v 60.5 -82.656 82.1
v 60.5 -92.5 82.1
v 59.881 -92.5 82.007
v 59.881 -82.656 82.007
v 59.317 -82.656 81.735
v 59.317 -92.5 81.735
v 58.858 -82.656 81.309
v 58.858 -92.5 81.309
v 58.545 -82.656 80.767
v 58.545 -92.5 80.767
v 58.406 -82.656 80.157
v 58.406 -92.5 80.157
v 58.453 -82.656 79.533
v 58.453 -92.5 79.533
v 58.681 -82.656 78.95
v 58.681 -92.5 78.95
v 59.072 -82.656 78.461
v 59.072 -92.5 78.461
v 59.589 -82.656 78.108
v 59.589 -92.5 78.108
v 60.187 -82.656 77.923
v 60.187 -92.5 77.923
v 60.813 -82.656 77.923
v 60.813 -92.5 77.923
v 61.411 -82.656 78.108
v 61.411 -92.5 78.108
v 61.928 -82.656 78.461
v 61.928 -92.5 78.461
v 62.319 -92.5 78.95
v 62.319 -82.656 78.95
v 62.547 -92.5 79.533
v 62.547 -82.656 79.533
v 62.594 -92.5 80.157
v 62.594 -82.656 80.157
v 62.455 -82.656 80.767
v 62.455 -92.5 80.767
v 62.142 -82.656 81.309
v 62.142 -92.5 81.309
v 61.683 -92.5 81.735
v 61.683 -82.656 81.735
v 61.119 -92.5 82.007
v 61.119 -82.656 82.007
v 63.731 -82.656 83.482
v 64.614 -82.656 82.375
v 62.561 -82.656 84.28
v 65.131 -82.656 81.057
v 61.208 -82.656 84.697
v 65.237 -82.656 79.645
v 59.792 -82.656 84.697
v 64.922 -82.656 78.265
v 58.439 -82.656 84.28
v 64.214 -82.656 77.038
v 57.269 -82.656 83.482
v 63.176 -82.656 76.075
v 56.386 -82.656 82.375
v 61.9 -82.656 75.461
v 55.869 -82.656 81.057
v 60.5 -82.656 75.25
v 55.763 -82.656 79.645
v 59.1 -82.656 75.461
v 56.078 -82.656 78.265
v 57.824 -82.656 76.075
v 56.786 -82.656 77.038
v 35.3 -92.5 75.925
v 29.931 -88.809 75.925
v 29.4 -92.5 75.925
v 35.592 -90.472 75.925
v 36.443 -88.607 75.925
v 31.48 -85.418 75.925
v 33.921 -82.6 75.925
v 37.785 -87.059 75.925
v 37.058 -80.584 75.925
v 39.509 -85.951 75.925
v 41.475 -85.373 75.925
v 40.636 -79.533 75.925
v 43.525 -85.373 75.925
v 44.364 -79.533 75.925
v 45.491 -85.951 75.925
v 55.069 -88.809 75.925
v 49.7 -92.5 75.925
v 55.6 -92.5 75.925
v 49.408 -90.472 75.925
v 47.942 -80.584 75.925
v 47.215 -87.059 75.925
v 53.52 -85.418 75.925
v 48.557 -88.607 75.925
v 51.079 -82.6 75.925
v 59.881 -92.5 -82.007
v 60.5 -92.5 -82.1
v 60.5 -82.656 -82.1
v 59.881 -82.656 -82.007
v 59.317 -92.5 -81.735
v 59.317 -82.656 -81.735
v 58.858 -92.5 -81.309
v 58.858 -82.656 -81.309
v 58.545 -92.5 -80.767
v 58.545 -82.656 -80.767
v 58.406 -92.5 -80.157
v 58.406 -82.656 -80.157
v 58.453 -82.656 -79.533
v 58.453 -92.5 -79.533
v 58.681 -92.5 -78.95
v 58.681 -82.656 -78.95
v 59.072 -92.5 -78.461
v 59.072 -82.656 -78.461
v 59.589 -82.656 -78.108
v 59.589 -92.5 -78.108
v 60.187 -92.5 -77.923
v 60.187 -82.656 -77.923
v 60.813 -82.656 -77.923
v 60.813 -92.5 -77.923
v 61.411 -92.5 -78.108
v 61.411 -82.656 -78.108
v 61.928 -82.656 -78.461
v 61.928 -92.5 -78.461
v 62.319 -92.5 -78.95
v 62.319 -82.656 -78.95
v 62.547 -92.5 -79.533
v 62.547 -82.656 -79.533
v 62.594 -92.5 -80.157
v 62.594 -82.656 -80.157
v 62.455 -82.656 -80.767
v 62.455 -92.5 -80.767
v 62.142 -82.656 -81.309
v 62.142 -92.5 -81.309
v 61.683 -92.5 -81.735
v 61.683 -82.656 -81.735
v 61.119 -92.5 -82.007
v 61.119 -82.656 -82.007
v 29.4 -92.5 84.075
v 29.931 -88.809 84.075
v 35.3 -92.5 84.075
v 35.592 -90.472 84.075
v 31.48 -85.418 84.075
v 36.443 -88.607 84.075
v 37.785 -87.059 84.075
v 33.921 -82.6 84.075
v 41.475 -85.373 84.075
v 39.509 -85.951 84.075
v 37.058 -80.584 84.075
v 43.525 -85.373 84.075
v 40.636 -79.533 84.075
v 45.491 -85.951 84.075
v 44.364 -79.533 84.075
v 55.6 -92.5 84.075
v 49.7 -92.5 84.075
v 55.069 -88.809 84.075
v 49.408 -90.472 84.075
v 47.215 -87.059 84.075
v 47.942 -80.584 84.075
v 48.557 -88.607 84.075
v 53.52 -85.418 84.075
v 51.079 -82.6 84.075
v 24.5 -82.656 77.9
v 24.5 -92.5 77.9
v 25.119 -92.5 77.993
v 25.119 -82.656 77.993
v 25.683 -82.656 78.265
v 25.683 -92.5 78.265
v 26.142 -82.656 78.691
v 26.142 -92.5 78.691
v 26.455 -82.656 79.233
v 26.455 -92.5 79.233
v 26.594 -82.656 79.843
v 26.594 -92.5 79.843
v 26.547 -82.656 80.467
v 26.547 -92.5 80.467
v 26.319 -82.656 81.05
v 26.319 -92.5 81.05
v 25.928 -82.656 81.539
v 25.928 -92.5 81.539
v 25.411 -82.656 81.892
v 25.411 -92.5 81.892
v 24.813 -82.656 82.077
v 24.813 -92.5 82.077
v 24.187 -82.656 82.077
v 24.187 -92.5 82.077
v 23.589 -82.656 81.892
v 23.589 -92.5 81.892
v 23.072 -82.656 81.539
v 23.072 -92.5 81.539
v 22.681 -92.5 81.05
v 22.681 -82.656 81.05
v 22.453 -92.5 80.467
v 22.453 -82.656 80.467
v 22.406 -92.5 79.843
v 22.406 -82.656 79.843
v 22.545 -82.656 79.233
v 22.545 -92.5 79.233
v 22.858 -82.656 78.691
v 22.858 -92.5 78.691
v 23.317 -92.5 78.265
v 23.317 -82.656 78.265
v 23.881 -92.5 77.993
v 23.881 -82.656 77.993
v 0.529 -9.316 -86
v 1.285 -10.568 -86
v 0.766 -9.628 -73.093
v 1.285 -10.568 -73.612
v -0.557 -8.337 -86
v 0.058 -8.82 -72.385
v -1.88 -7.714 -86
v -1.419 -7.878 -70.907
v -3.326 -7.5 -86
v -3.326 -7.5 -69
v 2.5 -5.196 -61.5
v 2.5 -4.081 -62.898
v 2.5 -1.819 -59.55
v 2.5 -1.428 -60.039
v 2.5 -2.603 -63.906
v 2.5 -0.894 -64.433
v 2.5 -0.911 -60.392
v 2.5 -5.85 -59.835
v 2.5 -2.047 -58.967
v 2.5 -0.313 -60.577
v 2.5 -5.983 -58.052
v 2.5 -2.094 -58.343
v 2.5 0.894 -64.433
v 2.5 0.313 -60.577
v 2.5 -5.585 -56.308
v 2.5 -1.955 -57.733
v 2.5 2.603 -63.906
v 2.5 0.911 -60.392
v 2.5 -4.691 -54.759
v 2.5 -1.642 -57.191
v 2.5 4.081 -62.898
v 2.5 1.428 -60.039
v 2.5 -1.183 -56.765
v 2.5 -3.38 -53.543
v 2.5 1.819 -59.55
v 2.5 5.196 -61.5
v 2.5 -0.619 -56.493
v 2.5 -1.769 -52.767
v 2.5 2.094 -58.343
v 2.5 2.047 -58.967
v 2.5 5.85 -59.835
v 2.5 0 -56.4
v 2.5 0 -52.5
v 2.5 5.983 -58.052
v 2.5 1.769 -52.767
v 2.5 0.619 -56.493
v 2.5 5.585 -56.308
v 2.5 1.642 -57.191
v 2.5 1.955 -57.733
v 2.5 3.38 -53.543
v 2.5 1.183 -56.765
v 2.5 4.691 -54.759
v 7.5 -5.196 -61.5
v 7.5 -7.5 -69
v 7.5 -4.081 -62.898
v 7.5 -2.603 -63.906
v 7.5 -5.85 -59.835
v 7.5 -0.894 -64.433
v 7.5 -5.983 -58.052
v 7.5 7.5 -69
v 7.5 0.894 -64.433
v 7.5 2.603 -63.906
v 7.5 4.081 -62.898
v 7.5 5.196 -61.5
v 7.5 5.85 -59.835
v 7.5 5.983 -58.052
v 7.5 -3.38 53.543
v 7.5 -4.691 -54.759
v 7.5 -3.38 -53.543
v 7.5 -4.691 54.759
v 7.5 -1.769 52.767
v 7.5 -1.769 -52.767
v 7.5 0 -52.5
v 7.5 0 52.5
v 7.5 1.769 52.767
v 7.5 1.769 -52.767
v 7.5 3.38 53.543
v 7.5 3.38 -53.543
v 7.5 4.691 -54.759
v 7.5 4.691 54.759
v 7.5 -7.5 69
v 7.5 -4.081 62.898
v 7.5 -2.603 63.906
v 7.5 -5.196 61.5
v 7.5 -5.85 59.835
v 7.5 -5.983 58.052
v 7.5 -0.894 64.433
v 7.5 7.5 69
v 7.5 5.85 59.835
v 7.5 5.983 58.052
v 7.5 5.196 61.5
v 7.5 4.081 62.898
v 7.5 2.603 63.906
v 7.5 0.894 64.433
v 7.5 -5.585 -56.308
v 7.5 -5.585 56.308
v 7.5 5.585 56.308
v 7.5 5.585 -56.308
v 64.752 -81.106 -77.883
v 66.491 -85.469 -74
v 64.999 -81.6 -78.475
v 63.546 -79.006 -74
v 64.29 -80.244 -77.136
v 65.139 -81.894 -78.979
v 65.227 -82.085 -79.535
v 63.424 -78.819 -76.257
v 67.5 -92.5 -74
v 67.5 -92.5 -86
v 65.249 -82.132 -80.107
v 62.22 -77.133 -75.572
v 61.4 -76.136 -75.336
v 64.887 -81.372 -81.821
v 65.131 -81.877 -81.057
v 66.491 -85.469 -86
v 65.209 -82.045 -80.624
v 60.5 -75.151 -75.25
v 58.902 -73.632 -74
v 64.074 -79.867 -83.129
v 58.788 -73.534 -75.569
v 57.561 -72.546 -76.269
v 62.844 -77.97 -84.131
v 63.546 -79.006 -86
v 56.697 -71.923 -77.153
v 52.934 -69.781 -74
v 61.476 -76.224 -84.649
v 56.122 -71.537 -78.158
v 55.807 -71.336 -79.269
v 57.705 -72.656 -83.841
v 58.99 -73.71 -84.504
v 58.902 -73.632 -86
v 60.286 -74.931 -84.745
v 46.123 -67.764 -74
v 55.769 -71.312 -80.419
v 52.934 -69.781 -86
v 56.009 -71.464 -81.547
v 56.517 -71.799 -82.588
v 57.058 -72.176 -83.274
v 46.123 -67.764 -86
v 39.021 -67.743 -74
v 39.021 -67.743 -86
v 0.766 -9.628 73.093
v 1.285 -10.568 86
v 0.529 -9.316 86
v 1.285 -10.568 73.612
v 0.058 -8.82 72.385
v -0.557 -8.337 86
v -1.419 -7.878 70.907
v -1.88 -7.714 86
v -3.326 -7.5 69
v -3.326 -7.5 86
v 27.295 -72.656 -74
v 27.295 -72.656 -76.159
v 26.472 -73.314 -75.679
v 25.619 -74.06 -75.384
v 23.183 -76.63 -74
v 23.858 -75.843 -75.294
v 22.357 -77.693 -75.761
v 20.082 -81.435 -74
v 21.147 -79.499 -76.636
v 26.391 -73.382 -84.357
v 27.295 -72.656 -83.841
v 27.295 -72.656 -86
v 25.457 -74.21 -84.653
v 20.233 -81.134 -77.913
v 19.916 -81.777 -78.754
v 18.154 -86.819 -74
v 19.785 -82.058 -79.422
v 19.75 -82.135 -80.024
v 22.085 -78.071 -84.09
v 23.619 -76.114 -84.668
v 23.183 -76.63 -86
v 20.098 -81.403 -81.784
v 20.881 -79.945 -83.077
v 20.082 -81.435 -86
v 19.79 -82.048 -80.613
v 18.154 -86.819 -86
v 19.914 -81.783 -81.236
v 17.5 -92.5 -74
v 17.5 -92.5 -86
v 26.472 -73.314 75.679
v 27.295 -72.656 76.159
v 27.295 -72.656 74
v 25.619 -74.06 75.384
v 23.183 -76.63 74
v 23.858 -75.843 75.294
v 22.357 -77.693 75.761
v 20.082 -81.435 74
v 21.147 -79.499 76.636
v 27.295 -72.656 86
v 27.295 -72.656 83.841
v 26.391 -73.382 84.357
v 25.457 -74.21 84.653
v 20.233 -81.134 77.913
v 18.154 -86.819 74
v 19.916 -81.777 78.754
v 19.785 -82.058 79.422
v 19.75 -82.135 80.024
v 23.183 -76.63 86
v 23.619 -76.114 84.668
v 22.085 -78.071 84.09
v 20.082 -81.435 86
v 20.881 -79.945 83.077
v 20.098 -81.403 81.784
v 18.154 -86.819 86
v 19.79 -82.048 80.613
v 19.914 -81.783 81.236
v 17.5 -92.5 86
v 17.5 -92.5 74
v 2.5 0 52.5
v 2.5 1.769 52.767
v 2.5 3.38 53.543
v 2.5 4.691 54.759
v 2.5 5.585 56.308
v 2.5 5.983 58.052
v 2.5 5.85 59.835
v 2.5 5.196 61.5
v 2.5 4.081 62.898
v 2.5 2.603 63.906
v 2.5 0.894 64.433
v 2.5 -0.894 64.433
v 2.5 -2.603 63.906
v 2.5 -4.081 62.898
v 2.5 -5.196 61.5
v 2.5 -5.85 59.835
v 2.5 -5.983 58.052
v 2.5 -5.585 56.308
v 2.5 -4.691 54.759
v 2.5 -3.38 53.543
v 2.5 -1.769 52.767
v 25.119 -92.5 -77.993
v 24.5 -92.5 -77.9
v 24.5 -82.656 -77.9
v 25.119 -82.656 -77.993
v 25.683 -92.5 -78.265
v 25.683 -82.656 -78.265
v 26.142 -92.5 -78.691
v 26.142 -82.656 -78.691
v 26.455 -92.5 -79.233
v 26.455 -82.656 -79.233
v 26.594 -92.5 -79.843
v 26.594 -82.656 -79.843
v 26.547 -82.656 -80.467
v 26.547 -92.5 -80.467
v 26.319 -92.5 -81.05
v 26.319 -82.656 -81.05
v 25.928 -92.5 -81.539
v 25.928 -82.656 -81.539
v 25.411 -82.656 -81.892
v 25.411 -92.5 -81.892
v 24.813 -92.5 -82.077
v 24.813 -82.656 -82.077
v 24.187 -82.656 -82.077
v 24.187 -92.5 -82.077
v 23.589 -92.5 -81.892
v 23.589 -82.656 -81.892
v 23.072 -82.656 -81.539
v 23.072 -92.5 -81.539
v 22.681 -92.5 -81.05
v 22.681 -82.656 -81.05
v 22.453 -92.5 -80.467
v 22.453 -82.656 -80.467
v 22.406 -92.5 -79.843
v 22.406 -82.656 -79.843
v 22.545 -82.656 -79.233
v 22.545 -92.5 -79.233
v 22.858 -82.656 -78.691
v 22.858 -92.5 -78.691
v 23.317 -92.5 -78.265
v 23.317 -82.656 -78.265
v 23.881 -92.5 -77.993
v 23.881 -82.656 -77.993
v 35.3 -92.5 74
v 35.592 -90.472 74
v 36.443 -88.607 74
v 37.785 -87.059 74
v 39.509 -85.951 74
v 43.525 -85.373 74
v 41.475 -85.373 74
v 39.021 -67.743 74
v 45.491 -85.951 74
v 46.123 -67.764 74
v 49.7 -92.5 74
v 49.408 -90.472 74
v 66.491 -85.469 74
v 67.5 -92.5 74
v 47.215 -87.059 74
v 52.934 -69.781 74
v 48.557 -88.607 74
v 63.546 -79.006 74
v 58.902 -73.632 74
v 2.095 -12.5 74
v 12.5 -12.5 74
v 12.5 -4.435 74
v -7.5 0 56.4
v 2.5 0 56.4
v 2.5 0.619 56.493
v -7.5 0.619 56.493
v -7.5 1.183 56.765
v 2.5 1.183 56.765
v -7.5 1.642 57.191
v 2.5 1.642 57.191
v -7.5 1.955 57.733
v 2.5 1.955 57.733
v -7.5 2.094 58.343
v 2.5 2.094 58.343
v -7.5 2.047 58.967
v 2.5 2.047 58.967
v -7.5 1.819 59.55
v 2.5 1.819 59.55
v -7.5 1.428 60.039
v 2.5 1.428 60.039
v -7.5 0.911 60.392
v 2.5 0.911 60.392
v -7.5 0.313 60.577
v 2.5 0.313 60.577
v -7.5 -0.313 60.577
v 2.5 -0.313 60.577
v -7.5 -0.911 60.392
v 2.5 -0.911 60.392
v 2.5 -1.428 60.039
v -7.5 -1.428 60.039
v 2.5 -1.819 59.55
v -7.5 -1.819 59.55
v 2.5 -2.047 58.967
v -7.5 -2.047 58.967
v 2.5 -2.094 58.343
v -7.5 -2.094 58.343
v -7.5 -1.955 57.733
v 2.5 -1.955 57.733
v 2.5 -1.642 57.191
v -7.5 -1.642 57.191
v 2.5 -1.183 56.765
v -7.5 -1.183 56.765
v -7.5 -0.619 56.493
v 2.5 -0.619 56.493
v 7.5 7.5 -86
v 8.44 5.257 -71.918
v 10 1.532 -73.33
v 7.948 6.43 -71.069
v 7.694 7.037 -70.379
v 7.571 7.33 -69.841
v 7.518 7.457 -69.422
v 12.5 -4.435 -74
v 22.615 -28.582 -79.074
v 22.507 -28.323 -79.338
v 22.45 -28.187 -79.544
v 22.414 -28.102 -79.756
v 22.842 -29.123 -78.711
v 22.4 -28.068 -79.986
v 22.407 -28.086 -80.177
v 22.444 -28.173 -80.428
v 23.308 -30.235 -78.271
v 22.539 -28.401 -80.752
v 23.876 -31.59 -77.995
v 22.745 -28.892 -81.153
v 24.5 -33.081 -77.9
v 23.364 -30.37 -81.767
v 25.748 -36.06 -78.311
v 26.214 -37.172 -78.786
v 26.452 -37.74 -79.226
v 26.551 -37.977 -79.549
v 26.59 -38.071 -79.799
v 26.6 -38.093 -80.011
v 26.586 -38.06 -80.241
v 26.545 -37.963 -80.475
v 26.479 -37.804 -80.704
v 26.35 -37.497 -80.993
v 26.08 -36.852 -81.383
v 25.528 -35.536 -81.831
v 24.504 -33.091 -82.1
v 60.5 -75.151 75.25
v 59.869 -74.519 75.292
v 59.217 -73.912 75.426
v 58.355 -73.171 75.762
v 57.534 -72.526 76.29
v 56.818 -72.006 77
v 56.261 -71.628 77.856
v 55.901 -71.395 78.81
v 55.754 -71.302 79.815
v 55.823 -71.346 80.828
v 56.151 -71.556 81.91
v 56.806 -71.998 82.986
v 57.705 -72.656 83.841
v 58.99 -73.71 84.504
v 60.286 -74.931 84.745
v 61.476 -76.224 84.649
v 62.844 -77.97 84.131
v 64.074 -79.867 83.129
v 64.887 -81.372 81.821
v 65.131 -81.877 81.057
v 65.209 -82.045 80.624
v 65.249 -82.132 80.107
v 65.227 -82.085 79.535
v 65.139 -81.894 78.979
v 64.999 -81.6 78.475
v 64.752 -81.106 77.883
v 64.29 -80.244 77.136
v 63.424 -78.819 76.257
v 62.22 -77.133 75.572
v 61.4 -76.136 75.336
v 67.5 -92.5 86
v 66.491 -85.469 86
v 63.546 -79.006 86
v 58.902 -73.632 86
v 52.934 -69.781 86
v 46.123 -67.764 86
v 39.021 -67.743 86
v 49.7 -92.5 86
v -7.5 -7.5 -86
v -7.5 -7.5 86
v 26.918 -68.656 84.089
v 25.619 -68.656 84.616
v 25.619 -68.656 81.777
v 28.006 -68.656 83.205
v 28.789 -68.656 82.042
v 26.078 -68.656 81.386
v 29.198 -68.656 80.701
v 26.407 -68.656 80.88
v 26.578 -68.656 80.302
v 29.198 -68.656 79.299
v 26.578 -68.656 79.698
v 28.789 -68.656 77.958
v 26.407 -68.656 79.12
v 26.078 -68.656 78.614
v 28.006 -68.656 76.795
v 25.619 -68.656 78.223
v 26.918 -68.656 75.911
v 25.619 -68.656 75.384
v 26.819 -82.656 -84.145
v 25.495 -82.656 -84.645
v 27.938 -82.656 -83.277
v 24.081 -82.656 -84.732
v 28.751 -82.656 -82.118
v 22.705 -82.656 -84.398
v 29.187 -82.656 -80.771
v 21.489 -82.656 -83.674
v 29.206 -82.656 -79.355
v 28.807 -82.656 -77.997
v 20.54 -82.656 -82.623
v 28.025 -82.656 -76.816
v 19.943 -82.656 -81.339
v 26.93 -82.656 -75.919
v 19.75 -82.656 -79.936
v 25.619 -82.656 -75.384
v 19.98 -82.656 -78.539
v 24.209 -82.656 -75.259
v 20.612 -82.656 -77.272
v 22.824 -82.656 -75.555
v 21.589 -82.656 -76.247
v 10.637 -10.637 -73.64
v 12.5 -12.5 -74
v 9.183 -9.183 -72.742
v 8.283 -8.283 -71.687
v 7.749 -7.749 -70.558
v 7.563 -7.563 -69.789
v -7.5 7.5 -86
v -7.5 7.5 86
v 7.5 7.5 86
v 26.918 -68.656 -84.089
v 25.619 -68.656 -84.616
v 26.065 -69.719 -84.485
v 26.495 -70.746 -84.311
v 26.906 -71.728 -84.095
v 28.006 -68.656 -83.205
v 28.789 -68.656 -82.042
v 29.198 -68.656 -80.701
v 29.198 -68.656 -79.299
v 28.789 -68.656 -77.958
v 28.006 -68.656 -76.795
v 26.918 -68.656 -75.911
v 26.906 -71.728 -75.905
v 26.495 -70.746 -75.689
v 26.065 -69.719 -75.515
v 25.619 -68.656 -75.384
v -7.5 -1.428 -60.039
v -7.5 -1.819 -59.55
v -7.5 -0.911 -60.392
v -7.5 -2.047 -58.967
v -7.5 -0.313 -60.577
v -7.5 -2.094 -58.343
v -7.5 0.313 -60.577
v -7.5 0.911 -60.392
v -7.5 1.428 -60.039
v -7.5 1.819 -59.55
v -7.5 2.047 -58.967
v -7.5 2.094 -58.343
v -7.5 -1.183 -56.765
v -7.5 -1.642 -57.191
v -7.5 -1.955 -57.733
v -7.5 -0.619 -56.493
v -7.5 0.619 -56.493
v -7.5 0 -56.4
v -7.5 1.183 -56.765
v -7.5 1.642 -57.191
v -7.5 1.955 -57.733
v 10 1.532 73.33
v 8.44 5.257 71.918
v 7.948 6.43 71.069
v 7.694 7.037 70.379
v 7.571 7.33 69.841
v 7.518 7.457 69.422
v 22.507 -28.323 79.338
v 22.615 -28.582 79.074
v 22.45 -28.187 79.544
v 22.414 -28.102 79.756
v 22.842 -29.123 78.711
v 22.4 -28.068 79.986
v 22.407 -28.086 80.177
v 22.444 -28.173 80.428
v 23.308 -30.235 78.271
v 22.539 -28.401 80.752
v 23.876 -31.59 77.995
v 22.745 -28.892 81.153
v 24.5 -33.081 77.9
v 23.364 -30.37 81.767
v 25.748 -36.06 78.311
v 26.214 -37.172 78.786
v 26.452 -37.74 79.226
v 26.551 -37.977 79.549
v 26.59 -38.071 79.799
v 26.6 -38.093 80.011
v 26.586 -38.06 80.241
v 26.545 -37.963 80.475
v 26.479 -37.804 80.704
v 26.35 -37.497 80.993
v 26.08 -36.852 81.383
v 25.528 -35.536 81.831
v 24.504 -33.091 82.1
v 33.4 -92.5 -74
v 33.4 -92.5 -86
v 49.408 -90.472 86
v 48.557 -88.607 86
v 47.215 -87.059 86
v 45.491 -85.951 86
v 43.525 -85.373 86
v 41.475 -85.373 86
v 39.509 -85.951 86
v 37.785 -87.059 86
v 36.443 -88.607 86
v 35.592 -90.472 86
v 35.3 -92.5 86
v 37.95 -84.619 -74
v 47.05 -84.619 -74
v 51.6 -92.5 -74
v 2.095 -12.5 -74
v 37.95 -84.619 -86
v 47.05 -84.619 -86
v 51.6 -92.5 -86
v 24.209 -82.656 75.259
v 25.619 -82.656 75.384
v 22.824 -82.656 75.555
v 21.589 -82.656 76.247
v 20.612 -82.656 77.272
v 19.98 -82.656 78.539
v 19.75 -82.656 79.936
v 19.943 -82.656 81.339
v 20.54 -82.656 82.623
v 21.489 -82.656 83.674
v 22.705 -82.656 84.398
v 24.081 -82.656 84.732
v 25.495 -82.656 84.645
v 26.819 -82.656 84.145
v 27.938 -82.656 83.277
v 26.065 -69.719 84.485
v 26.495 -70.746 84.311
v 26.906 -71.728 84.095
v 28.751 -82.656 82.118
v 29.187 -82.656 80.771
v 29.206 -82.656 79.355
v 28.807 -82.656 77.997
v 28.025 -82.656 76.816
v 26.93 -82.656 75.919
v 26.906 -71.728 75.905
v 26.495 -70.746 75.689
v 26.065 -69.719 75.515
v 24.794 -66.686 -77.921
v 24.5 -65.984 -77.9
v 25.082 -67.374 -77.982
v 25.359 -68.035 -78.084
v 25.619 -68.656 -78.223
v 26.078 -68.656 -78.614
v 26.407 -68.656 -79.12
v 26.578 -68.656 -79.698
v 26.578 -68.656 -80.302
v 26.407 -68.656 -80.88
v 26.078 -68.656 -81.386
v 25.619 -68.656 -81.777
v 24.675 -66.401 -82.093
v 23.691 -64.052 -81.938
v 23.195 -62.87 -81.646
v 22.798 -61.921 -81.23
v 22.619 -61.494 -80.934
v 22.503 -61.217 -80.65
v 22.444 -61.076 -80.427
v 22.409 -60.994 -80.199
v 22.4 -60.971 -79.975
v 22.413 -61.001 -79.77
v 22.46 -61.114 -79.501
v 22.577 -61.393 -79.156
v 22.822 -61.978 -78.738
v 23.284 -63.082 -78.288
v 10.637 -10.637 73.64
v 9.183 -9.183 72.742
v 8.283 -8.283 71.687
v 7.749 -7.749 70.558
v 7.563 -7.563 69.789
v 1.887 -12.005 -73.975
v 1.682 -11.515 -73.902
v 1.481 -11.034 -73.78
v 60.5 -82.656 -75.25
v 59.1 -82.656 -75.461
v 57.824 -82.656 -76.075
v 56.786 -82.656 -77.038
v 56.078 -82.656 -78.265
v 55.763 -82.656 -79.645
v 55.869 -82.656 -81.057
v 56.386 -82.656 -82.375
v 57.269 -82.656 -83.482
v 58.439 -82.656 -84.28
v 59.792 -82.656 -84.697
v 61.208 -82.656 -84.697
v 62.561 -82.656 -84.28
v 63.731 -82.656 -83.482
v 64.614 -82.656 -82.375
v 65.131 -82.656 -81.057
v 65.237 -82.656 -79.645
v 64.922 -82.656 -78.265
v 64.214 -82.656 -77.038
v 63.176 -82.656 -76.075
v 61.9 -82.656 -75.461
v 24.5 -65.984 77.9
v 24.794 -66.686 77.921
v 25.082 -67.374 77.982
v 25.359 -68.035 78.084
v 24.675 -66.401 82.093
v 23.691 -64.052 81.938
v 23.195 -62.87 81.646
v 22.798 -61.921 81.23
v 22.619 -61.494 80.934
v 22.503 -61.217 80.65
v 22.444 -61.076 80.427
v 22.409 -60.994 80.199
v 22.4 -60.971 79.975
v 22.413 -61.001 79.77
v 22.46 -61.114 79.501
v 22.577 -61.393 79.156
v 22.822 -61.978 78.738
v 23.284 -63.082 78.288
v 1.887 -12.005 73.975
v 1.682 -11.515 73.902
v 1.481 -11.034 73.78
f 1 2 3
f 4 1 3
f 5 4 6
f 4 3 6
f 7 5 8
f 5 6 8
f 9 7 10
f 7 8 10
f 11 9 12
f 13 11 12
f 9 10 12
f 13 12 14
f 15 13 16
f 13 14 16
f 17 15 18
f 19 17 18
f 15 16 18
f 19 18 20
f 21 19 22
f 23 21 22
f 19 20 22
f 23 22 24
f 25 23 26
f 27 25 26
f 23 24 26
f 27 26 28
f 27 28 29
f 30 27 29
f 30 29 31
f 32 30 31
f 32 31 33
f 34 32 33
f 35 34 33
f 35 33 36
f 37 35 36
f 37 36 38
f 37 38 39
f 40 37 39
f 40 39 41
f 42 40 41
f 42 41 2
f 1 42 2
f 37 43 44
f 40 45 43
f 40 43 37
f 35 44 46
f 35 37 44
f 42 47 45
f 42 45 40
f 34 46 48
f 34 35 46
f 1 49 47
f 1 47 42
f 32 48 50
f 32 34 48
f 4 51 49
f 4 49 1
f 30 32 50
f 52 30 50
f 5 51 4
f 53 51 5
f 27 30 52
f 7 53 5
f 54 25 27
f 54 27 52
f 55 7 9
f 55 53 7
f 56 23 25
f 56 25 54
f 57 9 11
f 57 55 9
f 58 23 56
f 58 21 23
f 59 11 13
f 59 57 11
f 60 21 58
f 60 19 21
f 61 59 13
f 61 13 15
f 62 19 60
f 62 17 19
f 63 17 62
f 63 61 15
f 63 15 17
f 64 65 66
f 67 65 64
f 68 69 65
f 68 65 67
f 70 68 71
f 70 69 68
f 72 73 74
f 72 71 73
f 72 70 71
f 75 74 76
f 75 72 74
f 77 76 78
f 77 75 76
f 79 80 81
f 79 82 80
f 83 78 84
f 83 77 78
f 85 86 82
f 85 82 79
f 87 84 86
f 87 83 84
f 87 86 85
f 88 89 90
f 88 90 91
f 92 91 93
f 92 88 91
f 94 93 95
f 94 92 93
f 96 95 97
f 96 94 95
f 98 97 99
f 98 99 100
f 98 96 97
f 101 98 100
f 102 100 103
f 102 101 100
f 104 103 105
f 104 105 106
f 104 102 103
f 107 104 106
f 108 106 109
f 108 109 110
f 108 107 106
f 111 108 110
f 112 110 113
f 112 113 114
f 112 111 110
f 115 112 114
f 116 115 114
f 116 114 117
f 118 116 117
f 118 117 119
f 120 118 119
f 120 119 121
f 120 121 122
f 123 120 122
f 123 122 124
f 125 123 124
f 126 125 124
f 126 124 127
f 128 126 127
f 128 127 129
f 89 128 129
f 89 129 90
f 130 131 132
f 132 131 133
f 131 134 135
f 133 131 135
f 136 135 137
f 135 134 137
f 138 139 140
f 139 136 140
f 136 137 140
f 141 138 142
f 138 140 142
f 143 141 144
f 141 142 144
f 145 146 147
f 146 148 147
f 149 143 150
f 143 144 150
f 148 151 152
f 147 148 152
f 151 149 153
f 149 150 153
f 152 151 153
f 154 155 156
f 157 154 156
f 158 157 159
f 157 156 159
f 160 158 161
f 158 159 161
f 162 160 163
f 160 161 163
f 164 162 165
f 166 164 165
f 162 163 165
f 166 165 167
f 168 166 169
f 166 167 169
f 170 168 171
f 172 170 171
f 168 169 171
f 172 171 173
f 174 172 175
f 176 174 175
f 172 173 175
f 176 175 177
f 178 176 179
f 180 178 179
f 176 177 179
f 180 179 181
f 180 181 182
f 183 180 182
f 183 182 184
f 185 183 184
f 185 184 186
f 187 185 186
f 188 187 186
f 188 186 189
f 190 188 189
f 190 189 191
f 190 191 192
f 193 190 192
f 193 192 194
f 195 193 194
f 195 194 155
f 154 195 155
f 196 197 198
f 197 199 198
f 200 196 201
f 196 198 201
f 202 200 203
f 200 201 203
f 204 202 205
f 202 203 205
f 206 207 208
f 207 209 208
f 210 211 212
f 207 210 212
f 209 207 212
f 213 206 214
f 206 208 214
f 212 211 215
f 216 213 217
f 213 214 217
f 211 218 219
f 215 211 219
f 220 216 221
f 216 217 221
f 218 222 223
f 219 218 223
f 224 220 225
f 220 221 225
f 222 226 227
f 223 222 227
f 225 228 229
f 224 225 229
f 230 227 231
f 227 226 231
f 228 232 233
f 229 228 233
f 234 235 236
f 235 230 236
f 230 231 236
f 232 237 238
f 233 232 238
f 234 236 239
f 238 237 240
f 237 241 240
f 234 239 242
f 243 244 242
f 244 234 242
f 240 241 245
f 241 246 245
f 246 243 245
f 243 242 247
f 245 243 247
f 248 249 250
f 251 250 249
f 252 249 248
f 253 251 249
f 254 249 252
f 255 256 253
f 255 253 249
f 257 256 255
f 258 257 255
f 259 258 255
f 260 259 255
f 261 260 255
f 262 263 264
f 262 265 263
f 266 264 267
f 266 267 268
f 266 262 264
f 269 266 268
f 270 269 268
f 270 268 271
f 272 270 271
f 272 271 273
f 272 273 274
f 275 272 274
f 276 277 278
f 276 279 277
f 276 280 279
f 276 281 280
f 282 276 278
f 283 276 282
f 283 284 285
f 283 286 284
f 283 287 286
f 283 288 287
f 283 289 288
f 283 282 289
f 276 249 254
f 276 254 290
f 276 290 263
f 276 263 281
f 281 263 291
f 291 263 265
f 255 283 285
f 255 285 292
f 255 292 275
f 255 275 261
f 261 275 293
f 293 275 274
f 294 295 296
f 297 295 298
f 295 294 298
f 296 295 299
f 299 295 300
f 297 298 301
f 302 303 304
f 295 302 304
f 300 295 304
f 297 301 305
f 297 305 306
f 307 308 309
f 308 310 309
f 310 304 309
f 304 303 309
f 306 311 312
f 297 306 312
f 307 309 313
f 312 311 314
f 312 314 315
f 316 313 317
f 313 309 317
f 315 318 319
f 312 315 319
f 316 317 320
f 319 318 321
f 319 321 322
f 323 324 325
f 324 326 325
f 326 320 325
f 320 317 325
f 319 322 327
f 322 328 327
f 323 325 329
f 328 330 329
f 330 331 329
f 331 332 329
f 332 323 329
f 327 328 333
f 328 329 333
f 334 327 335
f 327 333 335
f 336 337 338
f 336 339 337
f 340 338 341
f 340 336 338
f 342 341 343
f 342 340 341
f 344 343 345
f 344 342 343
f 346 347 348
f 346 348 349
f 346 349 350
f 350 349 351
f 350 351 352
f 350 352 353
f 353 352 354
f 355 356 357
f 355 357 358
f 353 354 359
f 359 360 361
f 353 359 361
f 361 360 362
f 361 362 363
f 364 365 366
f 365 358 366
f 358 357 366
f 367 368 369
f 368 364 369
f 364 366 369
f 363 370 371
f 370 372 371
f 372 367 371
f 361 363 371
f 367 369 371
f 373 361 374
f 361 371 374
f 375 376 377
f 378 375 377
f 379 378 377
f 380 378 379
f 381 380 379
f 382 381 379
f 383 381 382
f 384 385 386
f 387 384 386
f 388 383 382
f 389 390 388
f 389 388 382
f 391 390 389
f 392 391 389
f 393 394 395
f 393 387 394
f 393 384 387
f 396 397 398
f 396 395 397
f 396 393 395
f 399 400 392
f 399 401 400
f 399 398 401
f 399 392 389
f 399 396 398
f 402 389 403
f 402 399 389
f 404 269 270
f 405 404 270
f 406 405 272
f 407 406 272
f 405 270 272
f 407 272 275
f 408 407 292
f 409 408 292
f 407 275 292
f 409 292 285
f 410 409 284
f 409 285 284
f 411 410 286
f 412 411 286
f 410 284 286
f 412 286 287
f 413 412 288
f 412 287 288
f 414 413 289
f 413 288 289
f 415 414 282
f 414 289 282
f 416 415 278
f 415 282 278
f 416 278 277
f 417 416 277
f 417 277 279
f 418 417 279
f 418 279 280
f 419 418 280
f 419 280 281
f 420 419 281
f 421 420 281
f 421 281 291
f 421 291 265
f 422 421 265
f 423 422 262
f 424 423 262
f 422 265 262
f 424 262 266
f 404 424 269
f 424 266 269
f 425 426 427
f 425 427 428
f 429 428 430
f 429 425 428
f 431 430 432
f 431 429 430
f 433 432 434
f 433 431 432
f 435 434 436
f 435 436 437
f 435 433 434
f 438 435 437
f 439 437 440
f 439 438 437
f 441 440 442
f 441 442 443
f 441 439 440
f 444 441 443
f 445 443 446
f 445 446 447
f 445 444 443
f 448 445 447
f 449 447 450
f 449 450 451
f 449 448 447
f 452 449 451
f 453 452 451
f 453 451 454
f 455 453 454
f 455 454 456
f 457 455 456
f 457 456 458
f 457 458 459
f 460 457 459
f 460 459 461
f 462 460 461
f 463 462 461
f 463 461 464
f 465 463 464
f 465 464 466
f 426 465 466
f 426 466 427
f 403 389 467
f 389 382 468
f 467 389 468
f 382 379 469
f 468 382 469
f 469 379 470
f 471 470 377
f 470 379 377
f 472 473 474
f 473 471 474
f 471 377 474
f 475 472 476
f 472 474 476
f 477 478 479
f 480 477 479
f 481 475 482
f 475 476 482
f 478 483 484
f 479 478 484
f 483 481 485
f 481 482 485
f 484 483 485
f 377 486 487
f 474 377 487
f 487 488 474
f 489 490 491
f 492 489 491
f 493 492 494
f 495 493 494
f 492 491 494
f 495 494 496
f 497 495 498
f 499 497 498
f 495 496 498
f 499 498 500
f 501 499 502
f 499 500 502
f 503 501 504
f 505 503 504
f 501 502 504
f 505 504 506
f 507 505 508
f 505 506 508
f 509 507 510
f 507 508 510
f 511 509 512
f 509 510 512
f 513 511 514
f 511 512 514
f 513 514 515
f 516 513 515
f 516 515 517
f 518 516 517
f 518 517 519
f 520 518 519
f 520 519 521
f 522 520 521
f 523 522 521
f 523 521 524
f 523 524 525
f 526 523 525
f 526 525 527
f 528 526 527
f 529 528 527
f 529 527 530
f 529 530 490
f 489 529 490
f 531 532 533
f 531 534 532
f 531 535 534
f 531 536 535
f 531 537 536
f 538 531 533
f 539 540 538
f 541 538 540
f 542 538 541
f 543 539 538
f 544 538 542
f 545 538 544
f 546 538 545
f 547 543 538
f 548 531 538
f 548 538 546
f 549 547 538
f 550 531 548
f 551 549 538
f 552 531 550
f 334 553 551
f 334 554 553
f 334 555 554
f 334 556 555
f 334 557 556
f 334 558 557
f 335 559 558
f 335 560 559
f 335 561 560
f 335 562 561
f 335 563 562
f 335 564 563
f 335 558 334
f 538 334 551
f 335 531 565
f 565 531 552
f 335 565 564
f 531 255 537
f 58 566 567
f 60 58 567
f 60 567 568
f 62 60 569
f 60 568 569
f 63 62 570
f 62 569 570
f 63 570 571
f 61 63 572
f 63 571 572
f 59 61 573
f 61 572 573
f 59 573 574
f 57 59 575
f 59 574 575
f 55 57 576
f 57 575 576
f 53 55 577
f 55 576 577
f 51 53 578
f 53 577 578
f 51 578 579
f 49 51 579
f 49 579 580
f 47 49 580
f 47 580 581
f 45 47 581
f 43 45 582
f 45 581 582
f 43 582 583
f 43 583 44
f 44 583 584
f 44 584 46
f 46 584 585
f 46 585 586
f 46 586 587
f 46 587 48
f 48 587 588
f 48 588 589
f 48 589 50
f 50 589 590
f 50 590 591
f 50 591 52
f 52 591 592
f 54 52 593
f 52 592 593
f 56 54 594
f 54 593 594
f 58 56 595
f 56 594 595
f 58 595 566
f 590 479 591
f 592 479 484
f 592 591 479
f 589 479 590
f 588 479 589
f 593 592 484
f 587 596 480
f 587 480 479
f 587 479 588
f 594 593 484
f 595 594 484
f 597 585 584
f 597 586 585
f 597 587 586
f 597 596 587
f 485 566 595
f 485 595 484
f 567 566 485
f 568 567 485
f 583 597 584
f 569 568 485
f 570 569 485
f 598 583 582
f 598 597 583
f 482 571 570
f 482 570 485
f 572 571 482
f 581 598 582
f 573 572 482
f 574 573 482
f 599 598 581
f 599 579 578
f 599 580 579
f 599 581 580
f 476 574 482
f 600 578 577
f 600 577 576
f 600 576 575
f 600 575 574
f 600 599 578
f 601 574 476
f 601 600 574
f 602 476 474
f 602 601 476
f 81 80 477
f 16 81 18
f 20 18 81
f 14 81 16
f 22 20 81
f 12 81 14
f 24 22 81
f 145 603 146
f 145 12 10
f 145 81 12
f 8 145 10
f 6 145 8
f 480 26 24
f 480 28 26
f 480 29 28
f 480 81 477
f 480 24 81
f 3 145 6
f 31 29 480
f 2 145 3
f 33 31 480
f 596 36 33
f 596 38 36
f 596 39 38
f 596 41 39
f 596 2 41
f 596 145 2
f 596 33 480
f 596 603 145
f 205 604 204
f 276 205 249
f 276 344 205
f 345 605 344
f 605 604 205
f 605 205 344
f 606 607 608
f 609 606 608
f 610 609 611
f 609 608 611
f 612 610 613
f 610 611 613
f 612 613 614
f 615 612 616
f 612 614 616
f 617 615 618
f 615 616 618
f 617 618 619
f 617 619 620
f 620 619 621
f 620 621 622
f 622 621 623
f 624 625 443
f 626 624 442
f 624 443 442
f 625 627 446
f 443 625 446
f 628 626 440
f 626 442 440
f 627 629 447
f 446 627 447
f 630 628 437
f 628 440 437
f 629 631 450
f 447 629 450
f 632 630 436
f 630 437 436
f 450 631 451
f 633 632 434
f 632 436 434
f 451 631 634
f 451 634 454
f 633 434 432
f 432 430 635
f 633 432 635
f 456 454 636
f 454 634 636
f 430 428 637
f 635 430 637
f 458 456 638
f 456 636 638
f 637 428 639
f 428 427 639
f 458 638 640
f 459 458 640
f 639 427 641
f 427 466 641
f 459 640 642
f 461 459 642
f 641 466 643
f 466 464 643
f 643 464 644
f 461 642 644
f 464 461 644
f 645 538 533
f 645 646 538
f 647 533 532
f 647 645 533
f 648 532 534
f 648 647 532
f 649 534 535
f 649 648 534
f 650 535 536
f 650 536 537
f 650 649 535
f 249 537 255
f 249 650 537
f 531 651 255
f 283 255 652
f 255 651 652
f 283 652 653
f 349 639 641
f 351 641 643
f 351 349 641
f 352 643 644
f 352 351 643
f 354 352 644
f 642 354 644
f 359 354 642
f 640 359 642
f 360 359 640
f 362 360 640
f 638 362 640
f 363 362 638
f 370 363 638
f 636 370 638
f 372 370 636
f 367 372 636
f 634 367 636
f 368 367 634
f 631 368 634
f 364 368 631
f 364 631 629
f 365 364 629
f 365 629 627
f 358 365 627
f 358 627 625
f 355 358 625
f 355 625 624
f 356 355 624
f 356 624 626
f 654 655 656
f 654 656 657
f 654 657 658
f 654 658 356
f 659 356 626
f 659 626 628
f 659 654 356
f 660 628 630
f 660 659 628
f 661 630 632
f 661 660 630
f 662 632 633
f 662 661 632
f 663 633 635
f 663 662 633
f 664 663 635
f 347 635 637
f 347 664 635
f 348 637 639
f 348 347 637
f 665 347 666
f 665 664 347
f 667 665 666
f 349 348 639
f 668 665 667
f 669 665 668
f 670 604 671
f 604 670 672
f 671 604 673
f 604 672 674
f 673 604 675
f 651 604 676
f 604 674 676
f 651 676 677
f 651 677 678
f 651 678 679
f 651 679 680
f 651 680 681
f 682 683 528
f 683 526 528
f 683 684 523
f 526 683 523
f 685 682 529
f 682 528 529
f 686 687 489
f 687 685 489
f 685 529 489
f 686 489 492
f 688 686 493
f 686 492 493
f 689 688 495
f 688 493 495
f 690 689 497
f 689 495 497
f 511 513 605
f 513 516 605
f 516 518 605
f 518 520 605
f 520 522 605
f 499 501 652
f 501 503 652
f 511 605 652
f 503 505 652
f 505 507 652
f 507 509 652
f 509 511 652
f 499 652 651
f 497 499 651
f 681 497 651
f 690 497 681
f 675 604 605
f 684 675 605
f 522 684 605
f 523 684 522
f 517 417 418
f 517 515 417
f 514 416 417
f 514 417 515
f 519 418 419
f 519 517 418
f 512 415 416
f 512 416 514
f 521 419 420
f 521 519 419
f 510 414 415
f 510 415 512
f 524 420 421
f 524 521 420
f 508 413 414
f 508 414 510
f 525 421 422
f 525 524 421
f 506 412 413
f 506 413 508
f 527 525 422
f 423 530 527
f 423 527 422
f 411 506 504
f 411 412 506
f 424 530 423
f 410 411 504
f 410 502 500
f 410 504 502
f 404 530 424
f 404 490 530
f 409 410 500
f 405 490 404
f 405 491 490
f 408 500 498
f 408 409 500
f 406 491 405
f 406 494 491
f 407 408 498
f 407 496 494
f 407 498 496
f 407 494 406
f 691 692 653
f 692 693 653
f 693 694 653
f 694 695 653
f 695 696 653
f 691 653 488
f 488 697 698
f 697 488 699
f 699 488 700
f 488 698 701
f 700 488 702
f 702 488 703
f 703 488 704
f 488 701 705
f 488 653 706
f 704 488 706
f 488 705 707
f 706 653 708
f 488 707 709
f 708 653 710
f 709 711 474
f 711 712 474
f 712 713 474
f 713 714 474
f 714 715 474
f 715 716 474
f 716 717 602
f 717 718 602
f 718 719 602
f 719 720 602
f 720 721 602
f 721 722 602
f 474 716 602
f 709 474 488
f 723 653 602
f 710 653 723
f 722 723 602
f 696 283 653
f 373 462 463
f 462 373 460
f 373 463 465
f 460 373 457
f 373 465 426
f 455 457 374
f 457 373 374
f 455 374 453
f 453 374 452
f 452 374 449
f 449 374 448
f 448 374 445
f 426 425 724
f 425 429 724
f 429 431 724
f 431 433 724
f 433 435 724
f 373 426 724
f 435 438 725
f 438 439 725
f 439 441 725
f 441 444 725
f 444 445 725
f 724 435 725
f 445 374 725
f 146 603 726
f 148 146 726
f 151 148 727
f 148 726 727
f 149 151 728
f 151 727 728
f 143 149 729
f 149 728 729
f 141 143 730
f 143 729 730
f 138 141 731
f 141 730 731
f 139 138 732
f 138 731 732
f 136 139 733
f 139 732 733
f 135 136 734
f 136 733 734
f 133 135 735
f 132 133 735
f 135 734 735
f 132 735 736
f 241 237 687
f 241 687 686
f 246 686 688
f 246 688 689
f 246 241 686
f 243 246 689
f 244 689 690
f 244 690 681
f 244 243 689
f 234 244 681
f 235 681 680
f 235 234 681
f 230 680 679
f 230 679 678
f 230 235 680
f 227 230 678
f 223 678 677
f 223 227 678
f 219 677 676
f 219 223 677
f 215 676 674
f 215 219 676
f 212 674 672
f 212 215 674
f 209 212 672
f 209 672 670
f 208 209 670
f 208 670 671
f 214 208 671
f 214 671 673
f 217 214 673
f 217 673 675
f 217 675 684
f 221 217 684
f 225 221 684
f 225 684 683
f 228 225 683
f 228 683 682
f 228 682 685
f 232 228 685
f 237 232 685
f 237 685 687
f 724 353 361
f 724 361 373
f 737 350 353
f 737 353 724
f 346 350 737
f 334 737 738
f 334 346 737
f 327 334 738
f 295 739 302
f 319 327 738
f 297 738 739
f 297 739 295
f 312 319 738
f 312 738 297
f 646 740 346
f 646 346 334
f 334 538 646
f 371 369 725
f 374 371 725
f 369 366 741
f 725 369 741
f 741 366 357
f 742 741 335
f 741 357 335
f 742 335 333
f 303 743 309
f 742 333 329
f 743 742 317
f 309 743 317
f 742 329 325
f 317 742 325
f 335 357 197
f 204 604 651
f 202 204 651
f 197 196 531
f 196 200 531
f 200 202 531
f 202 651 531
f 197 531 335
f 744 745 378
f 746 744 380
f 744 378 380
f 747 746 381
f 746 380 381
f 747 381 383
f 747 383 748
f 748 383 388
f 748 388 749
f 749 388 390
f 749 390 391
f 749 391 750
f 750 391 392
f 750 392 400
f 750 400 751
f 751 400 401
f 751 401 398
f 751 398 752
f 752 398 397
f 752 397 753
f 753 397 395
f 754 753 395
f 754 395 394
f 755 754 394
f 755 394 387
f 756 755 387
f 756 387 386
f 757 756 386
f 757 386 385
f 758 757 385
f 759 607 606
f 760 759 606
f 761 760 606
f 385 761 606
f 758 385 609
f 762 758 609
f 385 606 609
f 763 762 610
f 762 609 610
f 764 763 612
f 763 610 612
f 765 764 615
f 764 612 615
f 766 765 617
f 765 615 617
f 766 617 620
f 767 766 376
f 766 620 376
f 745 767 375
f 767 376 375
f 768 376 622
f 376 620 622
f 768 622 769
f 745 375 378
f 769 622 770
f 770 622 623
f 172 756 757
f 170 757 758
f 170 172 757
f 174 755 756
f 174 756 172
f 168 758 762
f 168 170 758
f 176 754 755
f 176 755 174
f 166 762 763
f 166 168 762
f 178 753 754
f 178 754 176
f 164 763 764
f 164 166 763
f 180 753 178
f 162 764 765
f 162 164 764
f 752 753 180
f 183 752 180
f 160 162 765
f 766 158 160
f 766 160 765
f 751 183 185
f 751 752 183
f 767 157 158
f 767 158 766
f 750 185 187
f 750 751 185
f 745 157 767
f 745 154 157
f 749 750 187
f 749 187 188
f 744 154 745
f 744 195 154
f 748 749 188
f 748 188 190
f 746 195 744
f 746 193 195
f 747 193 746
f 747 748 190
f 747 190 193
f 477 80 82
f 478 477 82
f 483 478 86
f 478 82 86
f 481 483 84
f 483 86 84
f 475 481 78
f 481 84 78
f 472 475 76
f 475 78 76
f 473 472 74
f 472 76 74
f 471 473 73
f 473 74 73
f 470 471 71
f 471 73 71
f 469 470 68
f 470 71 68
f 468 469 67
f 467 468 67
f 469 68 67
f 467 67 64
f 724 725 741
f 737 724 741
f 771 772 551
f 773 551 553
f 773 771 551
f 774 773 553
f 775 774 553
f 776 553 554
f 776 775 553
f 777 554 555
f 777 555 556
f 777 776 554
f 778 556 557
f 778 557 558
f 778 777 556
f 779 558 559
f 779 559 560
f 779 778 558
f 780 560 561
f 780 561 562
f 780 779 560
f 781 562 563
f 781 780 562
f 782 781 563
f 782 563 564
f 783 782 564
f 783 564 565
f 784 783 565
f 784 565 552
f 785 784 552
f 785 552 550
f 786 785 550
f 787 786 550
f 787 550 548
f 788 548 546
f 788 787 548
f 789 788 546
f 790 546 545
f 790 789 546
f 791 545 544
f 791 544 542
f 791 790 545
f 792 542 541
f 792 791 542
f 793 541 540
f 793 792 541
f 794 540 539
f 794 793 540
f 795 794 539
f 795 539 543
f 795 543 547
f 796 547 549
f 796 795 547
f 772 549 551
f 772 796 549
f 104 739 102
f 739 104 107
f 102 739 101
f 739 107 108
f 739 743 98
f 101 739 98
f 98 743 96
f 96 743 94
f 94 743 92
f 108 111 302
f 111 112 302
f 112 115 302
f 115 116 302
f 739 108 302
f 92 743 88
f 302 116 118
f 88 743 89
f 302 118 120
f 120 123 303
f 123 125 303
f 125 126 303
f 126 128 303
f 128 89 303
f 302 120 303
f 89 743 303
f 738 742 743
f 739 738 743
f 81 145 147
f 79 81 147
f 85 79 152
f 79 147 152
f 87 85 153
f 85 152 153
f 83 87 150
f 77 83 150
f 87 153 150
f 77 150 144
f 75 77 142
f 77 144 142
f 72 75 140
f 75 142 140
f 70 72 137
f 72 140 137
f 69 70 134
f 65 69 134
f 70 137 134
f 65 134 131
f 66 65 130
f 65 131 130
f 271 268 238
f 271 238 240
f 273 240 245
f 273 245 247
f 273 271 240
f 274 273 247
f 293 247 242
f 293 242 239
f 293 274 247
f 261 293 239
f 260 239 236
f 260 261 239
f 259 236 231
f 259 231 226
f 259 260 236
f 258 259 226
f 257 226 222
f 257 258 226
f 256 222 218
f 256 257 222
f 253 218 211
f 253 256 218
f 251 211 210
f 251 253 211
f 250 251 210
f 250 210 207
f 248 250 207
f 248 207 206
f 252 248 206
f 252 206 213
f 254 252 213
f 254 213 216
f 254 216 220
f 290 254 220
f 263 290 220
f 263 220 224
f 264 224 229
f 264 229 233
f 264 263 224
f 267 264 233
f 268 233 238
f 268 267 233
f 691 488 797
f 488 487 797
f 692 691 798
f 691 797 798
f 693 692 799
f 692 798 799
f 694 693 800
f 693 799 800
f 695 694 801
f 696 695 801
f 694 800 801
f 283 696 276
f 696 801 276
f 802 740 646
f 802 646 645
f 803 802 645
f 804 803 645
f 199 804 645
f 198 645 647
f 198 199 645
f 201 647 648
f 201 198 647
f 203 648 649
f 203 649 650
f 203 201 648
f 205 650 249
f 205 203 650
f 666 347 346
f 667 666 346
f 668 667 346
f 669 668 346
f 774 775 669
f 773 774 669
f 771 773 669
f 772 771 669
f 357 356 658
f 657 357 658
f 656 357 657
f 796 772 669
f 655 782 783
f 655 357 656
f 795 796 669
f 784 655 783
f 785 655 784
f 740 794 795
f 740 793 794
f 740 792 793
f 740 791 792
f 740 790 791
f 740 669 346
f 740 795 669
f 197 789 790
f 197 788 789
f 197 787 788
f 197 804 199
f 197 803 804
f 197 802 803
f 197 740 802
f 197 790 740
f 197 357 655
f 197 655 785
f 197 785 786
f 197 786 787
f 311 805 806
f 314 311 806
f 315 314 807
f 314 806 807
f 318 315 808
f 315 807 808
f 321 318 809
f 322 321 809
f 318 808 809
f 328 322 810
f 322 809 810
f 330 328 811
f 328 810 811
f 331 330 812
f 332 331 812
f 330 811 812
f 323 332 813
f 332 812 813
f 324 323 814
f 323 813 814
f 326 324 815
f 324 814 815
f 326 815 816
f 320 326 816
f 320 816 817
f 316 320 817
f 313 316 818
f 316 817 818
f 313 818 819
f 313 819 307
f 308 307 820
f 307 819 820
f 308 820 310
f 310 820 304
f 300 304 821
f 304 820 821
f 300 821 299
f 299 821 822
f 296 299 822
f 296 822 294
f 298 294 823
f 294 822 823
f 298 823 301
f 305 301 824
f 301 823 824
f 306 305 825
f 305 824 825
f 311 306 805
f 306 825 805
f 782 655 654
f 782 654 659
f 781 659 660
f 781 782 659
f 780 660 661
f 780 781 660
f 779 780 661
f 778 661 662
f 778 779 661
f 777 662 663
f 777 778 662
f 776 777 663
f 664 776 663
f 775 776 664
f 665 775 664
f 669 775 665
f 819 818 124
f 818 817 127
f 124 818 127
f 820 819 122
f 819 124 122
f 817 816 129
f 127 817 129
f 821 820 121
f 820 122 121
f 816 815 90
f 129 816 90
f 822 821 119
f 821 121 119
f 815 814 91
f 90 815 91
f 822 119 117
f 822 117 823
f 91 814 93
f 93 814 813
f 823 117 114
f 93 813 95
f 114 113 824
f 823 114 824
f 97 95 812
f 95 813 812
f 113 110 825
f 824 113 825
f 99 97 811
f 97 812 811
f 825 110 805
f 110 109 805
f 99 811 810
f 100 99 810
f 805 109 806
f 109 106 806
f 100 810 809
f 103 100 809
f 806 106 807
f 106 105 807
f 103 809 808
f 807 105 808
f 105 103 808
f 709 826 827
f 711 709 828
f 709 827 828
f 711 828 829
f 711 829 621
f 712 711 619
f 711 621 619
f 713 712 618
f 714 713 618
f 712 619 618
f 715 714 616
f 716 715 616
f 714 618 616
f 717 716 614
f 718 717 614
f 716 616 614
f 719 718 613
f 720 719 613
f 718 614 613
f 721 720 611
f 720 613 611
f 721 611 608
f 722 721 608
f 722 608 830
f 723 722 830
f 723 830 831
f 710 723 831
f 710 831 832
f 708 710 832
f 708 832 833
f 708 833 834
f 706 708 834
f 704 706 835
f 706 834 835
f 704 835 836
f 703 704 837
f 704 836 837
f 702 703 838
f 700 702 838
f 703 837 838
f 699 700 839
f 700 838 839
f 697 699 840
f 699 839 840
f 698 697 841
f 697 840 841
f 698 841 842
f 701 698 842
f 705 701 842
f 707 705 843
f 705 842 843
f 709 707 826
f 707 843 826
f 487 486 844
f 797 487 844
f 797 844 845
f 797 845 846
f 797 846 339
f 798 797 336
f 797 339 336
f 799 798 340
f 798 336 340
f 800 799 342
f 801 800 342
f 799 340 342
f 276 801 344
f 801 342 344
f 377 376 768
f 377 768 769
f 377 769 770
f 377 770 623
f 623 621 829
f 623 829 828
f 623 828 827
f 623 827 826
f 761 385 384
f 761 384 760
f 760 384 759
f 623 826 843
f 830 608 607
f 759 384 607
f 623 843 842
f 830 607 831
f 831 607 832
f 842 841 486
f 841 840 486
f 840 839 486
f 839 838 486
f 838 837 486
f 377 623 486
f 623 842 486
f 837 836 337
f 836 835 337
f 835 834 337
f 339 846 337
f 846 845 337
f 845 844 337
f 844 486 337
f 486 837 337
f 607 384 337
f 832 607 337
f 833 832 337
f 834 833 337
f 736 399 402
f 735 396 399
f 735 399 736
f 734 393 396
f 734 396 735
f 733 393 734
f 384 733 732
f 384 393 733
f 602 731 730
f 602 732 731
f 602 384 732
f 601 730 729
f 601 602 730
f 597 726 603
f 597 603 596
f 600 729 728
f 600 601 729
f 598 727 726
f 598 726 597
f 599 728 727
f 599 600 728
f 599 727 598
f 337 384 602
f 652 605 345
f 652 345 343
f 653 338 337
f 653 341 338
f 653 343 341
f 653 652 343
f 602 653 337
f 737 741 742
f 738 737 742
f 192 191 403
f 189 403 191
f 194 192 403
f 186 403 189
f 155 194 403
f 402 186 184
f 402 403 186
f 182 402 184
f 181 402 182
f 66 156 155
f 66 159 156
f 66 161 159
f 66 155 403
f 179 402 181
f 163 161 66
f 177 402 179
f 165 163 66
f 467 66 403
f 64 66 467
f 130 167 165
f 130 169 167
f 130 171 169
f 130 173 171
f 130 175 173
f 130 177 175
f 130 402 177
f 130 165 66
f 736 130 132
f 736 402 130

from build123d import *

# Parameters (mm, degrees)
SKETCH1_W               = 15
SKETCH1_H               = 15
BOSS_EXTRUDE1_DEPTH     = 86
BOSS_EXTRUDE2_DEPTH     = 12
SKETCH3_R               = 6
CUT_EXTRUDE1_DEPTH      = 5
SKETCH4_R               = 2.1
CUT_EXTRUDE2_DEPTH      = 135.726016512
BOSS_EXTRUDE5_DEPTH     = 12
SKETCH8_R               = 4.75
CUT_EXTRUDE4_DEPTH      = 4
CUT_EXTRUDE4_DEPTH_BACK = 10
SKETCH6_R               = 2.1
CUT_EXTRUDE5_DEPTH      = 149.162917192
FILLET1_R               = 5
CUT_EXTRUDE6_REACH      = 208.631
SKETCH9_R               = 7.2
CUT_EXTRUDE7_START      = -1.925
SKETCH10_R              = 13.1
CUT_EXTRUDE7_DEPTH      = 8.15
CUT_EXTRUDE8_REACH      = 208.631


with BuildPart() as part:
    # Sketch1 → Boss-Extrude1 (new body)
    with BuildSketch(Plane.XY):
        Rectangle(SKETCH1_W, SKETCH1_H)
    extrude(amount=BOSS_EXTRUDE1_DEPTH)

    # Sketch2 → Boss-Extrude2 (add)
    with BuildSketch(Plane.XY.offset(86)):
        Polygon((7.5, 7.5), (49.391891892, -92.5), (35.608108108, -92.5), (0, -7.5), align=None)
    extrude(amount=-BOSS_EXTRUDE2_DEPTH)

    # Sketch3 → Cut-Extrude1 (cut)
    with BuildSketch(Plane(origin=(7.5, 0, 0), x_dir=(0, 0, -1), z_dir=(1, 0, 0))):
        with Locations((-58.5, 0)):
            Circle(SKETCH3_R)
    extrude(amount=-CUT_EXTRUDE1_DEPTH, mode=Mode.SUBTRACT)

    # Sketch4 → Cut-Extrude2 (cut, through all)
    with BuildSketch(Plane(origin=(2.5, 0, 0), x_dir=(0, 0, -1), z_dir=(1, 0, 0))):
        with Locations((-58.5, 0)):
            Circle(SKETCH4_R)
    extrude(amount=-CUT_EXTRUDE2_DEPTH, mode=Mode.SUBTRACT)

    # Sketch5 → Boss-Extrude5 (add)
    with BuildSketch(Plane.XY.offset(86)):
        with BuildLine():
            Line((17.5, -92.5), (67.5, -92.5))
            ThreePointArc((67.5, -92.5), (42.5, -67.5), (17.5, -92.5))
        make_face()
    extrude(amount=-BOSS_EXTRUDE5_DEPTH)

    # Sketch8 → Cut-Extrude4 (cut, two sides)
    with BuildSketch(Plane(origin=(0, -72.655502084, 0), x_dir=(1, 0, 0), z_dir=(0, 1, 0))) as cut_extrude4_sk:
        with Locations(Location((24.5, -80, 0), (0, 0, 76.371804965))):
            Circle(SKETCH8_R)
        with Locations(Location((60.5, -80, 0), (0, 0, 90))):
            Circle(SKETCH8_R)
    extrude(amount=CUT_EXTRUDE4_DEPTH, mode=Mode.SUBTRACT)
    extrude(cut_extrude4_sk.sketch, amount=-CUT_EXTRUDE4_DEPTH_BACK, mode=Mode.SUBTRACT)

    # Sketch6 → Cut-Extrude5 (cut, through all)
    with BuildSketch(Plane.XZ.offset(92.5)):
        with Locations(Location((24.5, 80, 0), (0, 0, 270))):
            Circle(SKETCH6_R)
        with Locations(Location((60.5, 80, 0), (0, 0, 90))):
            Circle(SKETCH6_R)
    extrude(amount=-CUT_EXTRUDE5_DEPTH, mode=Mode.SUBTRACT)

    # Fillet1
    fillet1_edges = [part.edges().sort_by_distance(p)[0] for p in [
        (3.75, -7.5, 74),
        (7.5, 0, 74),
        (0, -7.5, 80),
    ]]
    fillet(fillet1_edges, radius=FILLET1_R)

    # Mirror2: part across plane


with BuildPart() as part_1:
    add(part.part)
    add(part.part.mirror(Plane(origin=(0, 0, 0), x_dir=(1, 0, 0), z_dir=(0, 0, -1))))

    # Sketch9 → Cut-Extrude6 (cut, up to next)
    with BuildSketch(Plane.XY.offset(86), mode=Mode.PRIVATE) as cut_extrude6_sk1:
        with Locations((42.5, -92.5)):
            Circle(SKETCH9_R)
    cut_extrude6_tool1 = extrude(cut_extrude6_sk1.sketch, amount=-CUT_EXTRUDE6_REACH, mode=Mode.PRIVATE) & part_1.part
    add(cut_extrude6_tool1.solids().sort_by_distance((42.5, -92.5, 86))[0], mode=Mode.SUBTRACT)

    # Sketch10 → Cut-Extrude7 (cut)
    with BuildSketch(Plane.XY.offset(86).offset(CUT_EXTRUDE7_START)):
        with Locations((42.5, -92.5)):
            Circle(SKETCH10_R)
    extrude(amount=-CUT_EXTRUDE7_DEPTH, mode=Mode.SUBTRACT)

    # Sketch11 → Cut-Extrude8 (cut, up to next)
    with BuildSketch(Plane(origin=(0, 0, -86), x_dir=(-1, 0, 0), z_dir=(0, 0, -1)), mode=Mode.PRIVATE) as cut_extrude8_sk1:
        Polygon((-33.4, -92.5), (-37.95, -84.619168826), (-47.05, -84.619168826), (-51.6, -92.5), (-47.05, -100.380831174), (-37.95, -100.380831174), align=None)
    cut_extrude8_tool1 = extrude(cut_extrude8_sk1.sketch, amount=-CUT_EXTRUDE8_REACH, mode=Mode.PRIVATE) & part_1.part
    add(cut_extrude8_tool1.solids().sort_by_distance((42.5, -92.5, -86))[0], mode=Mode.SUBTRACT)


solid = part_1.part
